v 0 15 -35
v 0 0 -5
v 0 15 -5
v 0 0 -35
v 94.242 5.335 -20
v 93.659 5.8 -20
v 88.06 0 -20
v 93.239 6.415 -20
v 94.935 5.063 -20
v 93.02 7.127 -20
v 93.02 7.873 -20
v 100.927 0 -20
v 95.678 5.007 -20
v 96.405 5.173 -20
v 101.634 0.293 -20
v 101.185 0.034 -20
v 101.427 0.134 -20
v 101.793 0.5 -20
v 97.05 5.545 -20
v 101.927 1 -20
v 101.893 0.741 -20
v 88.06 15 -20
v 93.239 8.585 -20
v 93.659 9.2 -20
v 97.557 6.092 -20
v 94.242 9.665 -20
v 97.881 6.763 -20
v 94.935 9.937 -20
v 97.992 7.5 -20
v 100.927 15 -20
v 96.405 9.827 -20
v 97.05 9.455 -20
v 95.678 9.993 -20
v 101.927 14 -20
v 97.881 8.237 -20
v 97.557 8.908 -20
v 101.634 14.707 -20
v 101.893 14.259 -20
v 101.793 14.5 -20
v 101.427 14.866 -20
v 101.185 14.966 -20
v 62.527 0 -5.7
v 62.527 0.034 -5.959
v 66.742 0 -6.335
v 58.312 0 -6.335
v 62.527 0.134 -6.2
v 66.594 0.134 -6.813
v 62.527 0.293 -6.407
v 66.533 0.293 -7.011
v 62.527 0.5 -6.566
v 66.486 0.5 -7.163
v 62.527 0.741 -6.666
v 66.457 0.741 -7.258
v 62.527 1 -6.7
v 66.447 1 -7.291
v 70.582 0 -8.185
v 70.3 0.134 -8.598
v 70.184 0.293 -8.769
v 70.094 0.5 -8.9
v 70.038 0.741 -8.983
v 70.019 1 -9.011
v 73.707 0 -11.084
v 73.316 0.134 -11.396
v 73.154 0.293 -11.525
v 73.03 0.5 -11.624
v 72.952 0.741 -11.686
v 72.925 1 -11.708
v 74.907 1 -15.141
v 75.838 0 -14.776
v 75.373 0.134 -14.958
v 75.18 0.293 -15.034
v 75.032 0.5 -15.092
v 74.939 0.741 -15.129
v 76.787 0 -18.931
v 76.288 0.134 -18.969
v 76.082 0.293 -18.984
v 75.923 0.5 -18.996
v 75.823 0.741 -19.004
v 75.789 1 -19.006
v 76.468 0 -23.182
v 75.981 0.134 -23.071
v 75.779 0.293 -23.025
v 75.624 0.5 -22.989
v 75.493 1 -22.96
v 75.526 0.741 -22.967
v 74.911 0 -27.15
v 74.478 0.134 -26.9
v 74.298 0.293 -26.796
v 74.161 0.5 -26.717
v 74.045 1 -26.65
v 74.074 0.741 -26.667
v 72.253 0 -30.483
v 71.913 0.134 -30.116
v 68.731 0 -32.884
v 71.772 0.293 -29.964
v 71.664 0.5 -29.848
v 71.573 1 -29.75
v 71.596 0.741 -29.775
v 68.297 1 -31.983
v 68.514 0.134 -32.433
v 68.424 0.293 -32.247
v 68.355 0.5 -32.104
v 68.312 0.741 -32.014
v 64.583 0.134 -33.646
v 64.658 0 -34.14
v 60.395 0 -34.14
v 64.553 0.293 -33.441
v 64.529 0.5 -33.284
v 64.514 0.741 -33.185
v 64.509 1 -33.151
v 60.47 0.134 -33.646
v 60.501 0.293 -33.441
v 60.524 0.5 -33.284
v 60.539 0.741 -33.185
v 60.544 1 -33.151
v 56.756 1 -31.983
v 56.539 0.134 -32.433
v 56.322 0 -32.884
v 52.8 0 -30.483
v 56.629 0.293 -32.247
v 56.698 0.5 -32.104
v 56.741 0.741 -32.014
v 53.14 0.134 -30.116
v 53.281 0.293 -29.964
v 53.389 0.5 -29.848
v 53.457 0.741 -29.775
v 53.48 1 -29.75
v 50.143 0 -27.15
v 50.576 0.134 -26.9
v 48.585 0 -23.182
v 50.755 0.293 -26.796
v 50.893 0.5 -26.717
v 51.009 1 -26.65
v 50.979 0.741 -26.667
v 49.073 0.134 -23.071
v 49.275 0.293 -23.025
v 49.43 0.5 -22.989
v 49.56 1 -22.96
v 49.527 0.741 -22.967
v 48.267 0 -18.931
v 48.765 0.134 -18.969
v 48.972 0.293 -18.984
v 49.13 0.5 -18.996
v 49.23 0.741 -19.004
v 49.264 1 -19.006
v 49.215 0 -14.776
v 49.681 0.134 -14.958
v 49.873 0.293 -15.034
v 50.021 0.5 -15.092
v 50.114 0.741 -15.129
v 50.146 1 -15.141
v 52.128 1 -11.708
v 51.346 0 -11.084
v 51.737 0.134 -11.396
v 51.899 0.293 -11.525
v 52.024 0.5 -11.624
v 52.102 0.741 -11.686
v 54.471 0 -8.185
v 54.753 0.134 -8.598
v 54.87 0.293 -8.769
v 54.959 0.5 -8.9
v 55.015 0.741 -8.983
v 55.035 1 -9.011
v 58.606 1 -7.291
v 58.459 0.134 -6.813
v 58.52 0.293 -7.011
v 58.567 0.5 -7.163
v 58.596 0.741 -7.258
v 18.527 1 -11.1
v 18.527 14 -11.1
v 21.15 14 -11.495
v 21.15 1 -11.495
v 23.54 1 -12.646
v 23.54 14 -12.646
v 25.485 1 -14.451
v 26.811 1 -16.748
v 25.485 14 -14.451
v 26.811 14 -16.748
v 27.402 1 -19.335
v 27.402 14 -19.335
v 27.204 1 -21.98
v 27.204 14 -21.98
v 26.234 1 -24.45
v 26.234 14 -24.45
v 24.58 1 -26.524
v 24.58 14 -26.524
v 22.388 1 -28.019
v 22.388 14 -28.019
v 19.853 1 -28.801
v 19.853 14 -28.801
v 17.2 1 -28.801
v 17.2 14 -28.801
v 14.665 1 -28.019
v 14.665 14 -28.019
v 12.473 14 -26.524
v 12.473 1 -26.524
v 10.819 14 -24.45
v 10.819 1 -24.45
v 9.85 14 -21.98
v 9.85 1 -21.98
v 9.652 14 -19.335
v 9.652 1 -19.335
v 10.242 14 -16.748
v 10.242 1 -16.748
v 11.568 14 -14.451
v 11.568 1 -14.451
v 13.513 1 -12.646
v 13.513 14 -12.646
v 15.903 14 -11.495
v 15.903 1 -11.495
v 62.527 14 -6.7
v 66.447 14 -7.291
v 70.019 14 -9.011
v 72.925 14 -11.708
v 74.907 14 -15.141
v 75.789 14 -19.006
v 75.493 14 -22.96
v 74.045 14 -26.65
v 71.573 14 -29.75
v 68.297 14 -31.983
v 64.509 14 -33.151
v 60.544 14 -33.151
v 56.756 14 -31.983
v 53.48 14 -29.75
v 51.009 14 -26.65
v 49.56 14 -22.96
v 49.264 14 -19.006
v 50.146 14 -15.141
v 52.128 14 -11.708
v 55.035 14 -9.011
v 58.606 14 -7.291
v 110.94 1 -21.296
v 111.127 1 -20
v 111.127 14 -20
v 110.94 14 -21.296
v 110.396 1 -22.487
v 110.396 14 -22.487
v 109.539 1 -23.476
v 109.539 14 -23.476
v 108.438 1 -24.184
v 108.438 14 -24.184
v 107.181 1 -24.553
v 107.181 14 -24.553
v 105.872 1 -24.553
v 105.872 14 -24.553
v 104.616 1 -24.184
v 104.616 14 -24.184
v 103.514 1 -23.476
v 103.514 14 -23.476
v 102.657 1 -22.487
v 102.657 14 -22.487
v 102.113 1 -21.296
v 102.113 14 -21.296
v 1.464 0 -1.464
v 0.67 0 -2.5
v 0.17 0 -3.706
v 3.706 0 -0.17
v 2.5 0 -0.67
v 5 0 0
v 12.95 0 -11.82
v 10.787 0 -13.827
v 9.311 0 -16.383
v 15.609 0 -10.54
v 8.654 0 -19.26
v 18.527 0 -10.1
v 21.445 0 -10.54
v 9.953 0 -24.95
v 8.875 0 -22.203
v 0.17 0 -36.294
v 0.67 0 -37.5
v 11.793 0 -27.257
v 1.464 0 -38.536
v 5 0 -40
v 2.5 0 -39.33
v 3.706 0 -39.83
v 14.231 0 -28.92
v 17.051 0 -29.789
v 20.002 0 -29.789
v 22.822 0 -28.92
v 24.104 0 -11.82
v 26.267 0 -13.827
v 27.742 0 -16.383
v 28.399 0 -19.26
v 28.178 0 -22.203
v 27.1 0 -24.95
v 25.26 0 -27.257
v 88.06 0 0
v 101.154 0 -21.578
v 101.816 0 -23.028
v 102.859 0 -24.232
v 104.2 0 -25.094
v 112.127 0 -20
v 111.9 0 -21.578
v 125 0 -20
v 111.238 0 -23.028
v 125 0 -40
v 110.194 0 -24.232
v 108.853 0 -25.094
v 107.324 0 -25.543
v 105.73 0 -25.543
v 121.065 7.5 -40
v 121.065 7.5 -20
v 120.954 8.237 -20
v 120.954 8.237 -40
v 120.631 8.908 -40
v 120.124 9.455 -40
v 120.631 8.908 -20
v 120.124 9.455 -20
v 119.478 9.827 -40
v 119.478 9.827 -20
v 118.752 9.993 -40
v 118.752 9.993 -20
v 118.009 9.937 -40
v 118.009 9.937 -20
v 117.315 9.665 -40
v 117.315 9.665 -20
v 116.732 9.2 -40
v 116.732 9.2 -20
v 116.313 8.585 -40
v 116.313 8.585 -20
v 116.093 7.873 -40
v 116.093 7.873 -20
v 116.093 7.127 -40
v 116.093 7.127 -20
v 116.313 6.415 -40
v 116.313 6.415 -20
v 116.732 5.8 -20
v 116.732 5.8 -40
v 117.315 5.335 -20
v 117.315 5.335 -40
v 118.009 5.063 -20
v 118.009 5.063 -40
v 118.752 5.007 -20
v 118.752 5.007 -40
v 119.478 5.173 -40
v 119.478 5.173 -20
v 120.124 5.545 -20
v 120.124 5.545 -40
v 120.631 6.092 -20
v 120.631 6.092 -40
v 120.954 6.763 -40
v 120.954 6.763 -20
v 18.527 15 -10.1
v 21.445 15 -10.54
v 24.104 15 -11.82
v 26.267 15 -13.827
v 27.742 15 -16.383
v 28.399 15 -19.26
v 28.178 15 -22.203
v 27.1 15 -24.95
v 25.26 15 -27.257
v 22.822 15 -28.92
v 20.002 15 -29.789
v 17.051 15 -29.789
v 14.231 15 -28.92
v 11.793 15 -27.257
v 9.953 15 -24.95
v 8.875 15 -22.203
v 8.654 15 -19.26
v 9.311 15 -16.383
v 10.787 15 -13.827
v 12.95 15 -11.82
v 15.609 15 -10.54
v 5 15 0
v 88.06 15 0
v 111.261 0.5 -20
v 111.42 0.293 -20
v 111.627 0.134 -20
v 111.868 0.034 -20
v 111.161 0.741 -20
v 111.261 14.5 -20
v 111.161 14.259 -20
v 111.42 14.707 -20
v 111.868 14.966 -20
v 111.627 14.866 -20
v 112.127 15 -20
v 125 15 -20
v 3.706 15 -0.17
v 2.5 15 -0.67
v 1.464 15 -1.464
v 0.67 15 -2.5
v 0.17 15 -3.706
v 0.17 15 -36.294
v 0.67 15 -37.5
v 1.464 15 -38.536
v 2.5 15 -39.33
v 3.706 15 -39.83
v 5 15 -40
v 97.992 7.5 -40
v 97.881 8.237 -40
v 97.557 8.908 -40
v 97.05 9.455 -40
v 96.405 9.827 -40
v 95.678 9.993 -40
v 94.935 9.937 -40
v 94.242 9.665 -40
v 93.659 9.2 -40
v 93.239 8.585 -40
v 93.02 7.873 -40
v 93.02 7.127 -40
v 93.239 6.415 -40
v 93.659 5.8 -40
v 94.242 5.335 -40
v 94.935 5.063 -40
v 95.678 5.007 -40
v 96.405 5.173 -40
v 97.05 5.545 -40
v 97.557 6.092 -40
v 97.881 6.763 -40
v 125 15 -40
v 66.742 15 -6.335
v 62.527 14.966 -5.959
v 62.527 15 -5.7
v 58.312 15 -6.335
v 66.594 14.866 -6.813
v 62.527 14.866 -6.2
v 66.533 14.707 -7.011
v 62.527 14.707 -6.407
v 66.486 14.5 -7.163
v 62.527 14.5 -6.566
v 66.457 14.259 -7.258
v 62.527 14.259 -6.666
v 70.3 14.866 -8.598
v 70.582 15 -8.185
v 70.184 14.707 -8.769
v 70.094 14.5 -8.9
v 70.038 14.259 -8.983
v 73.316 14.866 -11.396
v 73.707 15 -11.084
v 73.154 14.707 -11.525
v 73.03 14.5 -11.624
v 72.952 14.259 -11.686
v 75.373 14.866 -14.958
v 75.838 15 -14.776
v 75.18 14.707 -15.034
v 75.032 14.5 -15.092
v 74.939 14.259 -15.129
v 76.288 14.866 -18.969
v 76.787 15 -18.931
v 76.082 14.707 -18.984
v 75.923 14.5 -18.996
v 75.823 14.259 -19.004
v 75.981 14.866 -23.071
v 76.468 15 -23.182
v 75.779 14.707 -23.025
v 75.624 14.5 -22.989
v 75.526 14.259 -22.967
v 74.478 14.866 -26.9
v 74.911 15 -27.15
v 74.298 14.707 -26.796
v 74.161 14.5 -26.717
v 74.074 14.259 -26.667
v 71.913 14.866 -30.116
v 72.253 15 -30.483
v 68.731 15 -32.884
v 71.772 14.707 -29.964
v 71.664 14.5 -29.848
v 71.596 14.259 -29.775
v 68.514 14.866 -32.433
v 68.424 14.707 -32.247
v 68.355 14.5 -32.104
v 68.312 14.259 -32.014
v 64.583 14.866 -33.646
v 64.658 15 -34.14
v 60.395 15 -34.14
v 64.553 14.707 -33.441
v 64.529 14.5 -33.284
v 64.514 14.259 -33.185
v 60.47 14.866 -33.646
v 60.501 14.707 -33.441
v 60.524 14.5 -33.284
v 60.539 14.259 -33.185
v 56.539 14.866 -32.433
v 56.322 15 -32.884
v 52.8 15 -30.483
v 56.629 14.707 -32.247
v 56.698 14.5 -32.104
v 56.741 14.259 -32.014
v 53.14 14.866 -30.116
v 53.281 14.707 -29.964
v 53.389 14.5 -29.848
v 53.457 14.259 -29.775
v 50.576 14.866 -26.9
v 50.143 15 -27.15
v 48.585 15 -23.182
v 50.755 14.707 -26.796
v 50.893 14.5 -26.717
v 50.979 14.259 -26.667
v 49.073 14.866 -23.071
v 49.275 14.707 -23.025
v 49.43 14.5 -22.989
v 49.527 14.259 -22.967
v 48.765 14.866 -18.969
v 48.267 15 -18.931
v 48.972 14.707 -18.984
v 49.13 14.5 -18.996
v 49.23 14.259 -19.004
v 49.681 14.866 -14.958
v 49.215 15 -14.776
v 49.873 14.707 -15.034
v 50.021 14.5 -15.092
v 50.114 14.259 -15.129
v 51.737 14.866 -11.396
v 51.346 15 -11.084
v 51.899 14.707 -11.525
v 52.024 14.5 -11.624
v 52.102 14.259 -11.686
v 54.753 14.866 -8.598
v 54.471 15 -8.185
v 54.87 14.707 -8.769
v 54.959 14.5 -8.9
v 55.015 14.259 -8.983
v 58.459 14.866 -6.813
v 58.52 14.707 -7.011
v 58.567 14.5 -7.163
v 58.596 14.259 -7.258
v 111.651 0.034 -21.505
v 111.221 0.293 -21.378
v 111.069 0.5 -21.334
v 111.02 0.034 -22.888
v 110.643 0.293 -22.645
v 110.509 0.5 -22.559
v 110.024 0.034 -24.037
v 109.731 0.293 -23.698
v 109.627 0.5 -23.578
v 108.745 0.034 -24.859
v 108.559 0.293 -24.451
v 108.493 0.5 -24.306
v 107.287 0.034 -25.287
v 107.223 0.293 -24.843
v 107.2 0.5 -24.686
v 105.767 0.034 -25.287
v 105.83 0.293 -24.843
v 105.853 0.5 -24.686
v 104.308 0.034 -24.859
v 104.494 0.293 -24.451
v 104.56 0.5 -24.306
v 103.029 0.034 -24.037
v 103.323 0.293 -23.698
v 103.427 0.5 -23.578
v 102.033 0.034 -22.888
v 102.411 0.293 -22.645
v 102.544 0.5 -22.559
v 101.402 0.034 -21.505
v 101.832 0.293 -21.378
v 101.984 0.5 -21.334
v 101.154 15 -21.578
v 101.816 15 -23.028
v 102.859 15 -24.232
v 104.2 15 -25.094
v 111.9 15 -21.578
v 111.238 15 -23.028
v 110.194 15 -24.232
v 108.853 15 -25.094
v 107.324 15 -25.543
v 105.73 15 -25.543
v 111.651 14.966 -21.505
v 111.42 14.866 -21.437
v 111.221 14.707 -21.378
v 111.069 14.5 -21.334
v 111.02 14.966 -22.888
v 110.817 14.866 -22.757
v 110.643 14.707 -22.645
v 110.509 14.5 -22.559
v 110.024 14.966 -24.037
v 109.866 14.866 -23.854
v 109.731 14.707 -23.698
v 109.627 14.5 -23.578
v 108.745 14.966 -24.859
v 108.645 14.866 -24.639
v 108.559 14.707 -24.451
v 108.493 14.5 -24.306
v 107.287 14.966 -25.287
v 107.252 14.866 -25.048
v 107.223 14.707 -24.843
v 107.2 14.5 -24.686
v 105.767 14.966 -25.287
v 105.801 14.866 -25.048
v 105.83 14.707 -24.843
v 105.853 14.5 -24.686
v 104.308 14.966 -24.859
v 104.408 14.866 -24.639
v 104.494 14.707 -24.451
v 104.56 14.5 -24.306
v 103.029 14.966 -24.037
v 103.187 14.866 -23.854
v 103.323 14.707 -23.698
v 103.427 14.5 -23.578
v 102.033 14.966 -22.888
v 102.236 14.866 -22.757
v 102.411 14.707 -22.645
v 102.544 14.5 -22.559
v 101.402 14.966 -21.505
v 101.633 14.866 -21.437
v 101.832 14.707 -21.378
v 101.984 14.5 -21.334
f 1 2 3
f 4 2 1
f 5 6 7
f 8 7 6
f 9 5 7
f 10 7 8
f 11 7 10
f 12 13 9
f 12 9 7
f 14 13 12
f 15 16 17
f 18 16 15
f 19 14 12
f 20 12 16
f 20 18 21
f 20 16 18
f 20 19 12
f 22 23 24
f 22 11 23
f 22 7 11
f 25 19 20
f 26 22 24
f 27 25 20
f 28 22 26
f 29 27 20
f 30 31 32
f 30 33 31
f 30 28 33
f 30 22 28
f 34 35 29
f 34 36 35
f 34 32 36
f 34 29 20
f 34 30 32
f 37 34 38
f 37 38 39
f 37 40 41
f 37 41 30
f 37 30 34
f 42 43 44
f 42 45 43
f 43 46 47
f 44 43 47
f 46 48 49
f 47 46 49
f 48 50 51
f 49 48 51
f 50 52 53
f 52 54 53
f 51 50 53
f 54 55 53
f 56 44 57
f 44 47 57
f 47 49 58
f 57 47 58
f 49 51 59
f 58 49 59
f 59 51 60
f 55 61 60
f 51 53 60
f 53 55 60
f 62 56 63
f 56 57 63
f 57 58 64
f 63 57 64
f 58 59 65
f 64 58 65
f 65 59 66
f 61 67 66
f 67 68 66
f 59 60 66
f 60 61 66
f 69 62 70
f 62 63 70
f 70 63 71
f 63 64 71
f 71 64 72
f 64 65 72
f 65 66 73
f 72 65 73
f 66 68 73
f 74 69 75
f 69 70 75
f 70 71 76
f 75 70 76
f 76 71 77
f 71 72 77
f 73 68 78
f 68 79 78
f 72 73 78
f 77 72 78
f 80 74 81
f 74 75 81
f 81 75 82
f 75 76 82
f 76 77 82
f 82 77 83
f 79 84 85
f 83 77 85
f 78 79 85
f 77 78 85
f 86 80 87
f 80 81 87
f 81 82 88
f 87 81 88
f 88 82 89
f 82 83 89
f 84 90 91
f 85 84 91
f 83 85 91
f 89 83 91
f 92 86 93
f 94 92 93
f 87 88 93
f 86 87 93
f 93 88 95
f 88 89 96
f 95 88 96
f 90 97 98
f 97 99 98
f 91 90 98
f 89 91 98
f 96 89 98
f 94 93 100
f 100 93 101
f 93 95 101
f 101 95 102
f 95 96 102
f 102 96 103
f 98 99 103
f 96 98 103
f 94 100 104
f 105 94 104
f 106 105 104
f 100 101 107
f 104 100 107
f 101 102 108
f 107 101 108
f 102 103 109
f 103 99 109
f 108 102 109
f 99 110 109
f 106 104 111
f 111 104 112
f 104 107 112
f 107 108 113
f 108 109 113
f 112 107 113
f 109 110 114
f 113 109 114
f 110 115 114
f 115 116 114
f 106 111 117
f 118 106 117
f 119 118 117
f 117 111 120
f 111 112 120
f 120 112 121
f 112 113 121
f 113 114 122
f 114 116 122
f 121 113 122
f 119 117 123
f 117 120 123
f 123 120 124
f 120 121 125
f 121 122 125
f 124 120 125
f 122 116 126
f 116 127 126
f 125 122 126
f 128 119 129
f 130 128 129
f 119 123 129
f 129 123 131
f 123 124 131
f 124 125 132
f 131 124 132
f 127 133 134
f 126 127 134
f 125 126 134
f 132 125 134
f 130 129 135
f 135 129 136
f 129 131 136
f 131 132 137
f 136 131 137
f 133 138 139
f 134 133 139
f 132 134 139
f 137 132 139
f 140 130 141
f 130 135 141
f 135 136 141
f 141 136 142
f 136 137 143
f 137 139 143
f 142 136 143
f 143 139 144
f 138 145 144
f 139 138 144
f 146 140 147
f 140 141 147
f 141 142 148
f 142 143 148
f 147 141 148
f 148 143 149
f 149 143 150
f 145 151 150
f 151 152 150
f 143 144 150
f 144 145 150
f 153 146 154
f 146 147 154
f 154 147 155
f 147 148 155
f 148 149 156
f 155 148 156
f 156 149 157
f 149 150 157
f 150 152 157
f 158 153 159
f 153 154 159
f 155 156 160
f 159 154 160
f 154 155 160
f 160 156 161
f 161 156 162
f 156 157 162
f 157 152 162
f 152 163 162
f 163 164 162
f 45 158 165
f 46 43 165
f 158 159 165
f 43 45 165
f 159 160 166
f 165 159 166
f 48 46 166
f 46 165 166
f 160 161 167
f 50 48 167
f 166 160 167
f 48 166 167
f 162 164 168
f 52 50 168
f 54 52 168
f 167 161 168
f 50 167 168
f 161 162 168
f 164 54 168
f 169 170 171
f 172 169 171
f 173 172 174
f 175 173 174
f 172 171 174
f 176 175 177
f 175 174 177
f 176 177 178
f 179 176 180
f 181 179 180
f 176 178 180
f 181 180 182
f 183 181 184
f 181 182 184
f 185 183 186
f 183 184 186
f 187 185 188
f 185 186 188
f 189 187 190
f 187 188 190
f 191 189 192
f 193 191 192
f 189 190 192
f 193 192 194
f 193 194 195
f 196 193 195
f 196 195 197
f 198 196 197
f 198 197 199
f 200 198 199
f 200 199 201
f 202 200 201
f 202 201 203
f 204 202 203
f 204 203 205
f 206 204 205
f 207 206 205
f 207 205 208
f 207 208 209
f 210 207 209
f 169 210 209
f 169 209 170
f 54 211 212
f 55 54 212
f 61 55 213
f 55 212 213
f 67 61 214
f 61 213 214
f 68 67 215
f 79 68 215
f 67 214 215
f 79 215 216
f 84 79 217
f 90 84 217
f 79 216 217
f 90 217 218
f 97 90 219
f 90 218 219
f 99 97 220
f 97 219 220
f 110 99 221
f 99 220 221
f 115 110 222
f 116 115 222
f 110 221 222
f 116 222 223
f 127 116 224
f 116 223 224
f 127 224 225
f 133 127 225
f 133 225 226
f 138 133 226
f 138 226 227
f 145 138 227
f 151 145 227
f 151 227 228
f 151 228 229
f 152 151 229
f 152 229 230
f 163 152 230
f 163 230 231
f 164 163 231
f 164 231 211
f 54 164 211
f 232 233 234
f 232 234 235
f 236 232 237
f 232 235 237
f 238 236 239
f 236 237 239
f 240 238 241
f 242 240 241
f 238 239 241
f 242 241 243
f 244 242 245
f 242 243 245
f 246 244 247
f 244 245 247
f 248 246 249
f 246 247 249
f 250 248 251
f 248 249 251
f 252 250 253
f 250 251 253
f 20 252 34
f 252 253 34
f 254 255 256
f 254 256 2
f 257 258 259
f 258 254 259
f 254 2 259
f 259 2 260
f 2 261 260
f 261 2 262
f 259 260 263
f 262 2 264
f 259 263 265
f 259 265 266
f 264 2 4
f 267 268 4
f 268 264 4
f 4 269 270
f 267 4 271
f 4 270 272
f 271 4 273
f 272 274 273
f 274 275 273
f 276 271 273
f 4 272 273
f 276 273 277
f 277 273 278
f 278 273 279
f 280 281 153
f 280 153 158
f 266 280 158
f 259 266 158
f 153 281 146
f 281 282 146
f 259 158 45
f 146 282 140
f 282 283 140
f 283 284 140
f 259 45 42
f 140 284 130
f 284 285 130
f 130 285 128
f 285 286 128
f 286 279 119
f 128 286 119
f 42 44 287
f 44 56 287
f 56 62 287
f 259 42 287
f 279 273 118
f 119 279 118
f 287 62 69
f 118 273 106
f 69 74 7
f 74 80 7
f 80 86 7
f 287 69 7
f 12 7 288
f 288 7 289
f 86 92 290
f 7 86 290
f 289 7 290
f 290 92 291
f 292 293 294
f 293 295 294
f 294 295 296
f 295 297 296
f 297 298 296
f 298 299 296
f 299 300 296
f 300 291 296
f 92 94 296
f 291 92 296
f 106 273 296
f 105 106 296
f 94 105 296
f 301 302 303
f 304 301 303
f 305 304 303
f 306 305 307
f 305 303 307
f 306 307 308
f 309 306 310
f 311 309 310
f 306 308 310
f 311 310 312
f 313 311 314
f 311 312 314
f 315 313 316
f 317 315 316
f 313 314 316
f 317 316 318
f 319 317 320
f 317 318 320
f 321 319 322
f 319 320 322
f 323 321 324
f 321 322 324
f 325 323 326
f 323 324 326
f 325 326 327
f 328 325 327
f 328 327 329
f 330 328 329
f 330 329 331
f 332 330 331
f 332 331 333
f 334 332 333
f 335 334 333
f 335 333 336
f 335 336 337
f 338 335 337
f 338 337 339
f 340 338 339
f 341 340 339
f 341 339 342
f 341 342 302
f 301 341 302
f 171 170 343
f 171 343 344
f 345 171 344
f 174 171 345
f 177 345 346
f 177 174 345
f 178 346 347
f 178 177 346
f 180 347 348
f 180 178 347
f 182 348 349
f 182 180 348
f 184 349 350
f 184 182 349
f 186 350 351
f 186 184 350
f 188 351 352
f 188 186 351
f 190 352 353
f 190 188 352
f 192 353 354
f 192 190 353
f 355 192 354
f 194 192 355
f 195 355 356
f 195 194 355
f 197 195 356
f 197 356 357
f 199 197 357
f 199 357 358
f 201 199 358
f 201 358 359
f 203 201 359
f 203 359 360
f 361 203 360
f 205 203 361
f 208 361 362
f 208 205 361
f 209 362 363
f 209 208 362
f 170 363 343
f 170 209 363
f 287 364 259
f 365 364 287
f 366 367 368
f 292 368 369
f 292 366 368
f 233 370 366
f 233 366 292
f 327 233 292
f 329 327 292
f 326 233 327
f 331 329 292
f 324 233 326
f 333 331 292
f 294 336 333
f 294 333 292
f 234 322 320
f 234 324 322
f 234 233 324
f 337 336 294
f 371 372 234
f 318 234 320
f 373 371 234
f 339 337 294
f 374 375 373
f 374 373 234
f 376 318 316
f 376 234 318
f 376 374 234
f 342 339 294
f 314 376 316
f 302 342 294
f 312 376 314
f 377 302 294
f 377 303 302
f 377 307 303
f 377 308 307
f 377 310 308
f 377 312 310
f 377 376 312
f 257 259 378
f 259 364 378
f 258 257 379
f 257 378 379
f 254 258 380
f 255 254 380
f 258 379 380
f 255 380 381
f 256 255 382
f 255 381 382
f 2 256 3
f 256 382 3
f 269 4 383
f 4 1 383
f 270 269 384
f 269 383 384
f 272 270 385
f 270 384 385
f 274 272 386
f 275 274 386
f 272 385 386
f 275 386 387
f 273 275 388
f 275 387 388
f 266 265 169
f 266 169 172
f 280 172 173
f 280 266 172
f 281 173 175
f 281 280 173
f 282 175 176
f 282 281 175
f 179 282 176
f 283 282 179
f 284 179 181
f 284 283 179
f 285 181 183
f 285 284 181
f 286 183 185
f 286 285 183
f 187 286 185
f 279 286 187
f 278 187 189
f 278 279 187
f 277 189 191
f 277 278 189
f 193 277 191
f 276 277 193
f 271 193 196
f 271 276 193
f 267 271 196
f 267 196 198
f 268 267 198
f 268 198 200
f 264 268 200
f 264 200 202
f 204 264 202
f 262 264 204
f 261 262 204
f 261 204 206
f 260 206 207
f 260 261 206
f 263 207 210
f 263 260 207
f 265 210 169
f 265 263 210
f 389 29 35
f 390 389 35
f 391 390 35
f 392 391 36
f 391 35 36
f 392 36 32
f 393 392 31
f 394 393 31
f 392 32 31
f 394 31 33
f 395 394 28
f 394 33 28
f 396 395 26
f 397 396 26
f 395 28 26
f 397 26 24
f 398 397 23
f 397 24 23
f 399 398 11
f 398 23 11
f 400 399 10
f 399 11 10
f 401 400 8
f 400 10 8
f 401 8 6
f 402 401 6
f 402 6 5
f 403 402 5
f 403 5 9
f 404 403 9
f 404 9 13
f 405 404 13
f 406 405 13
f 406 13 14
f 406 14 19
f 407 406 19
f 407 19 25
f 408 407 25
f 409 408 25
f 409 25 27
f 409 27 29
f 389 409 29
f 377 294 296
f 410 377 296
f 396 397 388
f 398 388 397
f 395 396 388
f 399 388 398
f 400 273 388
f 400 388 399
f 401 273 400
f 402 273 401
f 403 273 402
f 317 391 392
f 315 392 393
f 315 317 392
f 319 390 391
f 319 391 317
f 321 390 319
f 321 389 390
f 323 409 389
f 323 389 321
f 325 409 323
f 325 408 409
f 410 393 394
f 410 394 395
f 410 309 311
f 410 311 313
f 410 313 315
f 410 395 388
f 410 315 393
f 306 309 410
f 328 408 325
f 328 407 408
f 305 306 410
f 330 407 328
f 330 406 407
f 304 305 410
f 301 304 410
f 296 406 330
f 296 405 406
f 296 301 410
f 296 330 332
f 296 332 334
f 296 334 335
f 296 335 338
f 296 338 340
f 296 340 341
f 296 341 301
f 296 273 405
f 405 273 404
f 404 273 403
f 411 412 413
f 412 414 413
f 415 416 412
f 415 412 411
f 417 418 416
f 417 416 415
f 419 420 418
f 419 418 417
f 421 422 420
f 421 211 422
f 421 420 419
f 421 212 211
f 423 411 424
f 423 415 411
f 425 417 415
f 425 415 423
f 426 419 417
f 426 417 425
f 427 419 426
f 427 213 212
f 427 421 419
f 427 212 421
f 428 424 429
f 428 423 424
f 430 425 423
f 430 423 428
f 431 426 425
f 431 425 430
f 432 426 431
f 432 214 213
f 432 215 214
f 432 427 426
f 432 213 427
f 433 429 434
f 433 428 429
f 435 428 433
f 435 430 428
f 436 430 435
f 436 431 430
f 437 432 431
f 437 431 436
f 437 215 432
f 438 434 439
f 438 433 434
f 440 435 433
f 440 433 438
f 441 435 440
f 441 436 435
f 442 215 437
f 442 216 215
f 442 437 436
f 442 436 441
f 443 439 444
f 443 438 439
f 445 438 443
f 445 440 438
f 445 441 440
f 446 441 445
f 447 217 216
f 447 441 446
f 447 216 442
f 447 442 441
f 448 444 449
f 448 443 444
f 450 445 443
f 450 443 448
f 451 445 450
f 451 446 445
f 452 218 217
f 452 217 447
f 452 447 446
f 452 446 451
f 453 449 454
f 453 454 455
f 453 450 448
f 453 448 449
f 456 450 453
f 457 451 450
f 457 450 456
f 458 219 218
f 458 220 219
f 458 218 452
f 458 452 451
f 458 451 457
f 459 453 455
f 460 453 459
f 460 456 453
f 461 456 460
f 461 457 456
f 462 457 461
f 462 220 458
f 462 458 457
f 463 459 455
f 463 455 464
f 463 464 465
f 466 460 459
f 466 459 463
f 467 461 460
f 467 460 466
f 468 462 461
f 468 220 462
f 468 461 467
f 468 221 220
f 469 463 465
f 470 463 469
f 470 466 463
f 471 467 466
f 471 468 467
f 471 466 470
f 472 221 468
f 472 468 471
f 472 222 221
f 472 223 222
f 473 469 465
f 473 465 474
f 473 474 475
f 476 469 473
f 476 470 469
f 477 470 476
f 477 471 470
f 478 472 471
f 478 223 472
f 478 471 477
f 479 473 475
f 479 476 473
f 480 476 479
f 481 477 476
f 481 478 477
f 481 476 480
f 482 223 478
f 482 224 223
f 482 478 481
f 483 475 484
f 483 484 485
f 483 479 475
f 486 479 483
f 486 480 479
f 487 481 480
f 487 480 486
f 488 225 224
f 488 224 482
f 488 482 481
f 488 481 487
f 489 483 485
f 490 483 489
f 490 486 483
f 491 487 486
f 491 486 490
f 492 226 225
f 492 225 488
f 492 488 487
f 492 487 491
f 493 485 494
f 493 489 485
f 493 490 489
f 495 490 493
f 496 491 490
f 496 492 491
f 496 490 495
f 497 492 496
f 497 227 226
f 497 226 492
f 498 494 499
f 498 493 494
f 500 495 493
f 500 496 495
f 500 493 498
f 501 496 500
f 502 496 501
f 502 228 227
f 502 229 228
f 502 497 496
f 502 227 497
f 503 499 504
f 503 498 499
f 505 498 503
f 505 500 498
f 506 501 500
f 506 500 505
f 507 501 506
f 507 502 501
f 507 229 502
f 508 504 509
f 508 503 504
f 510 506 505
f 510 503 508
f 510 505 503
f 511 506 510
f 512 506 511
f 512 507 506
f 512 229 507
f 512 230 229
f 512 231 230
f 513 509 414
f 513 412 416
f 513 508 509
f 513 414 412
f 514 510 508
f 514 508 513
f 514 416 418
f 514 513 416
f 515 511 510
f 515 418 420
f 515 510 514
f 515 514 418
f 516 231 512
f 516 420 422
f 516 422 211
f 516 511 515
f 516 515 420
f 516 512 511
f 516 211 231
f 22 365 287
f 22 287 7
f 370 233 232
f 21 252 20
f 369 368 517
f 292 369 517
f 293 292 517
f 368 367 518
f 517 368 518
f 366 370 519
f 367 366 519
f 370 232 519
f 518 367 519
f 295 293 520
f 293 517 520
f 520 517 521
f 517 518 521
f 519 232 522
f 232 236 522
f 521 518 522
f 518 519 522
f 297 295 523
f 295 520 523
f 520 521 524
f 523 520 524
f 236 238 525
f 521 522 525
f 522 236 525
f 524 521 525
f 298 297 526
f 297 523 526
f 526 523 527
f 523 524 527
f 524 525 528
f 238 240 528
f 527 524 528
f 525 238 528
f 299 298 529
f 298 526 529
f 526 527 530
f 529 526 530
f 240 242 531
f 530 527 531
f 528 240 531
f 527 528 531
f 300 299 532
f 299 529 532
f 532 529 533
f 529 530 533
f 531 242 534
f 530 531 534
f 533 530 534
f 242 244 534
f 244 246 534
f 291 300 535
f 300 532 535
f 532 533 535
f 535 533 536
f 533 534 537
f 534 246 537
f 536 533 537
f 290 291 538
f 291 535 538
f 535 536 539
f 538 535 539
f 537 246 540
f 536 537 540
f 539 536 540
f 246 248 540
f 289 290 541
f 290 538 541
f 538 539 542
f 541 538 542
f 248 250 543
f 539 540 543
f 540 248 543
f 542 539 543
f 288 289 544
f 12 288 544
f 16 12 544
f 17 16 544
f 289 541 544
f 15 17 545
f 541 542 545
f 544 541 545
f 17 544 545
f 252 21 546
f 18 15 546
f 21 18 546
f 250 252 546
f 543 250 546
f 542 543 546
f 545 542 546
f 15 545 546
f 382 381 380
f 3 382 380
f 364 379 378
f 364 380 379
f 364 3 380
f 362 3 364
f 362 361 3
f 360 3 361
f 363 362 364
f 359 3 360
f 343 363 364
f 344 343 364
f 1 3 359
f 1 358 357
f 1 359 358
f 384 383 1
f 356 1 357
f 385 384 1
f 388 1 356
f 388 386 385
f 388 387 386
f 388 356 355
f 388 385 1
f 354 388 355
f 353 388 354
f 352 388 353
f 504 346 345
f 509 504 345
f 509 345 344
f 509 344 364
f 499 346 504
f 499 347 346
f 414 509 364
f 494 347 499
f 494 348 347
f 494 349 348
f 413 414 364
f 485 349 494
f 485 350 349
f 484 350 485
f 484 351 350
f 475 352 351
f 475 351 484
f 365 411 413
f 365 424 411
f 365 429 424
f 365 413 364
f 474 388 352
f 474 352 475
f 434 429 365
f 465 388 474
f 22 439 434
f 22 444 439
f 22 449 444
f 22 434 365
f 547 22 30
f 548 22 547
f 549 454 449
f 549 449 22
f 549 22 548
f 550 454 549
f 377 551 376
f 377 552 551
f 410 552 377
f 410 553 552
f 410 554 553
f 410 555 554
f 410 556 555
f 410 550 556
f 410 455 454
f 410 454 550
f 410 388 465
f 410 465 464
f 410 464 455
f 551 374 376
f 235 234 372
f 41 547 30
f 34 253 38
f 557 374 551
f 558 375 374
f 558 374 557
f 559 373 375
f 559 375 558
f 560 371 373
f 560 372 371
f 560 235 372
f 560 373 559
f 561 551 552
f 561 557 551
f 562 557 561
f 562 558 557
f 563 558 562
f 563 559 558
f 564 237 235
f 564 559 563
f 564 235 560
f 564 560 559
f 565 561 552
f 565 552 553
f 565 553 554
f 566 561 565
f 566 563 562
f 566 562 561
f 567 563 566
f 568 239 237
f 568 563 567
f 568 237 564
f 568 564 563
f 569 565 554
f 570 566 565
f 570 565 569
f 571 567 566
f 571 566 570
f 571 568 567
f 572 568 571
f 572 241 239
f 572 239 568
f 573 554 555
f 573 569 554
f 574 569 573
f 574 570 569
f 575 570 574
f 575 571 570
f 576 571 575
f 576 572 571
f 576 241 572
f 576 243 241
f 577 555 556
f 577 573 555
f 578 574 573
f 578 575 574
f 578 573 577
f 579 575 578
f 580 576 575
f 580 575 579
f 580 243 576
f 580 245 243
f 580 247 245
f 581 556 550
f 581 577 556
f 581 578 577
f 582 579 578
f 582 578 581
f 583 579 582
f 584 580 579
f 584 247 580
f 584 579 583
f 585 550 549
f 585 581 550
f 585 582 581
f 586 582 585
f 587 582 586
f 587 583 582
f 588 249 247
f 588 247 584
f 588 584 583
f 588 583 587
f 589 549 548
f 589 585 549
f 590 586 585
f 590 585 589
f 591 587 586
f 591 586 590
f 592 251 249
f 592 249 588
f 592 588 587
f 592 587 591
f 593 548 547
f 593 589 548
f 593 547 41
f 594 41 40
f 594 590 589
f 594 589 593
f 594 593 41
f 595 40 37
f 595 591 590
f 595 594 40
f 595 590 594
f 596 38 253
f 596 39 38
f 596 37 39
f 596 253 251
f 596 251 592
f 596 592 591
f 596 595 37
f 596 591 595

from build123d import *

# Parameters (mm, degrees)
SKETCH_1_W          = 125
SKETCH_1_H          = 40
EXTRUDE_1_DEPTH     = 15
SKETCH_2_R          = 8.9
SKETCH_2_R_2        = 4.6
SKETCH_2_R_3        = 13.3
CUT_EXTRUDE_1_DEPTH = 133.098448136
CHAMFER_1_SIZE      = 1
CHAMFER_2_SIZE      = 1
FILLET_1_R          = 1
SKETCH_5_W          = 40
SKETCH_5_H          = 20
CUT_EXTRUDE_2_DEPTH = 133.098448148
FILLET_4_R          = 5
SKETCH_12_W         = 3.06
SKETCH_12_H         = 20
EXTRUDE_2_DEPTH     = 15
SKETCH_14_R         = 2.5
CUT_EXTRUDE_3_DEPTH = 128.47548784


with BuildPart() as part:
    # 草圖1 → 填料-伸長1 (new body)
    with BuildSketch(Plane(origin=(0, 0, 0), x_dir=(1, 0, 0), z_dir=(0, 1, 0))):
        with Locations((62.5, 20)):
            Rectangle(SKETCH_1_W, SKETCH_1_H)
    extrude(amount=EXTRUDE_1_DEPTH)

    # 草圖2 → 除料-伸長1 (cut, through all)
    with BuildSketch(Plane(origin=(0, 15, 0), x_dir=(1, 0, 0), z_dir=(0, 1, 0))):
        with Locations(Location((18.526668527, 20, 0), (0, 0, 270))):
            Circle(SKETCH_2_R)
        with Locations(Location((106.526668527, 20, 0), (0, 0, 270))):
            Circle(SKETCH_2_R_2)
        with Locations(Location((62.526668527, 20, 0), (0, 0, 270))):
            Circle(SKETCH_2_R_3)
    extrude(amount=-CUT_EXTRUDE_1_DEPTH, mode=Mode.SUBTRACT)

    # 導角1
    chamfer_1_edges = [part.edges().sort_by_distance(p)[0] for p in [
        (18.526668527, 15, -28.9),
    ]]
    chamfer(chamfer_1_edges, length=CHAMFER_1_SIZE)

    # 導角2
    chamfer_2_edges = [part.edges().sort_by_distance(p)[0] for p in [
        (18.526668527, 0, -28.9),
    ]]
    chamfer(chamfer_2_edges, length=CHAMFER_2_SIZE)

    # 圓角1
    fillet_1_edges = [part.edges().sort_by_distance(p)[0] for p in [
        (106.526668527, 0, -24.6),
        (106.526668527, 15, -24.6),
        (62.526668527, 0, -33.3),
        (62.526668527, 15, -33.3),
    ]]
    fillet(fillet_1_edges, radius=FILLET_1_R)

    # 草圖5 → 除料-伸長2 (cut, through all)
    with BuildSketch(Plane(origin=(0, 15, 0), x_dir=(1, 0, 0), z_dir=(0, 1, 0))):
        with Locations((105, 10)):
            Rectangle(SKETCH_5_W, SKETCH_5_H)
    extrude(amount=-CUT_EXTRUDE_2_DEPTH, mode=Mode.SUBTRACT)

    # 圓角4
    fillet_4_edges = [part.edges().sort_by_distance(p)[0] for p in [
        (0, 7.5, -40),
        (0, 7.5, 0),
    ]]
    fillet(fillet_4_edges, radius=FILLET_4_R)

    # 草圖12 → 填料-伸長2 (add)
    with BuildSketch(Plane(origin=(0, 15, 0), x_dir=(1, 0, 0), z_dir=(0, 1, 0))):
        with Locations((86.53, 10)):
            Rectangle(SKETCH_12_W, SKETCH_12_H)
    extrude(amount=-EXTRUDE_2_DEPTH)

    # 草圖14 → 除料-伸長3 (cut, through all)
    with BuildSketch(Plane.XY.offset(-20)):
        with Locations((118.565, 7.5)):
            Circle(SKETCH_14_R)
        with Locations((95.491668527, 7.5)):
            Circle(SKETCH_14_R)
    extrude(amount=-CUT_EXTRUDE_3_DEPTH, mode=Mode.SUBTRACT)


solid = part.part
